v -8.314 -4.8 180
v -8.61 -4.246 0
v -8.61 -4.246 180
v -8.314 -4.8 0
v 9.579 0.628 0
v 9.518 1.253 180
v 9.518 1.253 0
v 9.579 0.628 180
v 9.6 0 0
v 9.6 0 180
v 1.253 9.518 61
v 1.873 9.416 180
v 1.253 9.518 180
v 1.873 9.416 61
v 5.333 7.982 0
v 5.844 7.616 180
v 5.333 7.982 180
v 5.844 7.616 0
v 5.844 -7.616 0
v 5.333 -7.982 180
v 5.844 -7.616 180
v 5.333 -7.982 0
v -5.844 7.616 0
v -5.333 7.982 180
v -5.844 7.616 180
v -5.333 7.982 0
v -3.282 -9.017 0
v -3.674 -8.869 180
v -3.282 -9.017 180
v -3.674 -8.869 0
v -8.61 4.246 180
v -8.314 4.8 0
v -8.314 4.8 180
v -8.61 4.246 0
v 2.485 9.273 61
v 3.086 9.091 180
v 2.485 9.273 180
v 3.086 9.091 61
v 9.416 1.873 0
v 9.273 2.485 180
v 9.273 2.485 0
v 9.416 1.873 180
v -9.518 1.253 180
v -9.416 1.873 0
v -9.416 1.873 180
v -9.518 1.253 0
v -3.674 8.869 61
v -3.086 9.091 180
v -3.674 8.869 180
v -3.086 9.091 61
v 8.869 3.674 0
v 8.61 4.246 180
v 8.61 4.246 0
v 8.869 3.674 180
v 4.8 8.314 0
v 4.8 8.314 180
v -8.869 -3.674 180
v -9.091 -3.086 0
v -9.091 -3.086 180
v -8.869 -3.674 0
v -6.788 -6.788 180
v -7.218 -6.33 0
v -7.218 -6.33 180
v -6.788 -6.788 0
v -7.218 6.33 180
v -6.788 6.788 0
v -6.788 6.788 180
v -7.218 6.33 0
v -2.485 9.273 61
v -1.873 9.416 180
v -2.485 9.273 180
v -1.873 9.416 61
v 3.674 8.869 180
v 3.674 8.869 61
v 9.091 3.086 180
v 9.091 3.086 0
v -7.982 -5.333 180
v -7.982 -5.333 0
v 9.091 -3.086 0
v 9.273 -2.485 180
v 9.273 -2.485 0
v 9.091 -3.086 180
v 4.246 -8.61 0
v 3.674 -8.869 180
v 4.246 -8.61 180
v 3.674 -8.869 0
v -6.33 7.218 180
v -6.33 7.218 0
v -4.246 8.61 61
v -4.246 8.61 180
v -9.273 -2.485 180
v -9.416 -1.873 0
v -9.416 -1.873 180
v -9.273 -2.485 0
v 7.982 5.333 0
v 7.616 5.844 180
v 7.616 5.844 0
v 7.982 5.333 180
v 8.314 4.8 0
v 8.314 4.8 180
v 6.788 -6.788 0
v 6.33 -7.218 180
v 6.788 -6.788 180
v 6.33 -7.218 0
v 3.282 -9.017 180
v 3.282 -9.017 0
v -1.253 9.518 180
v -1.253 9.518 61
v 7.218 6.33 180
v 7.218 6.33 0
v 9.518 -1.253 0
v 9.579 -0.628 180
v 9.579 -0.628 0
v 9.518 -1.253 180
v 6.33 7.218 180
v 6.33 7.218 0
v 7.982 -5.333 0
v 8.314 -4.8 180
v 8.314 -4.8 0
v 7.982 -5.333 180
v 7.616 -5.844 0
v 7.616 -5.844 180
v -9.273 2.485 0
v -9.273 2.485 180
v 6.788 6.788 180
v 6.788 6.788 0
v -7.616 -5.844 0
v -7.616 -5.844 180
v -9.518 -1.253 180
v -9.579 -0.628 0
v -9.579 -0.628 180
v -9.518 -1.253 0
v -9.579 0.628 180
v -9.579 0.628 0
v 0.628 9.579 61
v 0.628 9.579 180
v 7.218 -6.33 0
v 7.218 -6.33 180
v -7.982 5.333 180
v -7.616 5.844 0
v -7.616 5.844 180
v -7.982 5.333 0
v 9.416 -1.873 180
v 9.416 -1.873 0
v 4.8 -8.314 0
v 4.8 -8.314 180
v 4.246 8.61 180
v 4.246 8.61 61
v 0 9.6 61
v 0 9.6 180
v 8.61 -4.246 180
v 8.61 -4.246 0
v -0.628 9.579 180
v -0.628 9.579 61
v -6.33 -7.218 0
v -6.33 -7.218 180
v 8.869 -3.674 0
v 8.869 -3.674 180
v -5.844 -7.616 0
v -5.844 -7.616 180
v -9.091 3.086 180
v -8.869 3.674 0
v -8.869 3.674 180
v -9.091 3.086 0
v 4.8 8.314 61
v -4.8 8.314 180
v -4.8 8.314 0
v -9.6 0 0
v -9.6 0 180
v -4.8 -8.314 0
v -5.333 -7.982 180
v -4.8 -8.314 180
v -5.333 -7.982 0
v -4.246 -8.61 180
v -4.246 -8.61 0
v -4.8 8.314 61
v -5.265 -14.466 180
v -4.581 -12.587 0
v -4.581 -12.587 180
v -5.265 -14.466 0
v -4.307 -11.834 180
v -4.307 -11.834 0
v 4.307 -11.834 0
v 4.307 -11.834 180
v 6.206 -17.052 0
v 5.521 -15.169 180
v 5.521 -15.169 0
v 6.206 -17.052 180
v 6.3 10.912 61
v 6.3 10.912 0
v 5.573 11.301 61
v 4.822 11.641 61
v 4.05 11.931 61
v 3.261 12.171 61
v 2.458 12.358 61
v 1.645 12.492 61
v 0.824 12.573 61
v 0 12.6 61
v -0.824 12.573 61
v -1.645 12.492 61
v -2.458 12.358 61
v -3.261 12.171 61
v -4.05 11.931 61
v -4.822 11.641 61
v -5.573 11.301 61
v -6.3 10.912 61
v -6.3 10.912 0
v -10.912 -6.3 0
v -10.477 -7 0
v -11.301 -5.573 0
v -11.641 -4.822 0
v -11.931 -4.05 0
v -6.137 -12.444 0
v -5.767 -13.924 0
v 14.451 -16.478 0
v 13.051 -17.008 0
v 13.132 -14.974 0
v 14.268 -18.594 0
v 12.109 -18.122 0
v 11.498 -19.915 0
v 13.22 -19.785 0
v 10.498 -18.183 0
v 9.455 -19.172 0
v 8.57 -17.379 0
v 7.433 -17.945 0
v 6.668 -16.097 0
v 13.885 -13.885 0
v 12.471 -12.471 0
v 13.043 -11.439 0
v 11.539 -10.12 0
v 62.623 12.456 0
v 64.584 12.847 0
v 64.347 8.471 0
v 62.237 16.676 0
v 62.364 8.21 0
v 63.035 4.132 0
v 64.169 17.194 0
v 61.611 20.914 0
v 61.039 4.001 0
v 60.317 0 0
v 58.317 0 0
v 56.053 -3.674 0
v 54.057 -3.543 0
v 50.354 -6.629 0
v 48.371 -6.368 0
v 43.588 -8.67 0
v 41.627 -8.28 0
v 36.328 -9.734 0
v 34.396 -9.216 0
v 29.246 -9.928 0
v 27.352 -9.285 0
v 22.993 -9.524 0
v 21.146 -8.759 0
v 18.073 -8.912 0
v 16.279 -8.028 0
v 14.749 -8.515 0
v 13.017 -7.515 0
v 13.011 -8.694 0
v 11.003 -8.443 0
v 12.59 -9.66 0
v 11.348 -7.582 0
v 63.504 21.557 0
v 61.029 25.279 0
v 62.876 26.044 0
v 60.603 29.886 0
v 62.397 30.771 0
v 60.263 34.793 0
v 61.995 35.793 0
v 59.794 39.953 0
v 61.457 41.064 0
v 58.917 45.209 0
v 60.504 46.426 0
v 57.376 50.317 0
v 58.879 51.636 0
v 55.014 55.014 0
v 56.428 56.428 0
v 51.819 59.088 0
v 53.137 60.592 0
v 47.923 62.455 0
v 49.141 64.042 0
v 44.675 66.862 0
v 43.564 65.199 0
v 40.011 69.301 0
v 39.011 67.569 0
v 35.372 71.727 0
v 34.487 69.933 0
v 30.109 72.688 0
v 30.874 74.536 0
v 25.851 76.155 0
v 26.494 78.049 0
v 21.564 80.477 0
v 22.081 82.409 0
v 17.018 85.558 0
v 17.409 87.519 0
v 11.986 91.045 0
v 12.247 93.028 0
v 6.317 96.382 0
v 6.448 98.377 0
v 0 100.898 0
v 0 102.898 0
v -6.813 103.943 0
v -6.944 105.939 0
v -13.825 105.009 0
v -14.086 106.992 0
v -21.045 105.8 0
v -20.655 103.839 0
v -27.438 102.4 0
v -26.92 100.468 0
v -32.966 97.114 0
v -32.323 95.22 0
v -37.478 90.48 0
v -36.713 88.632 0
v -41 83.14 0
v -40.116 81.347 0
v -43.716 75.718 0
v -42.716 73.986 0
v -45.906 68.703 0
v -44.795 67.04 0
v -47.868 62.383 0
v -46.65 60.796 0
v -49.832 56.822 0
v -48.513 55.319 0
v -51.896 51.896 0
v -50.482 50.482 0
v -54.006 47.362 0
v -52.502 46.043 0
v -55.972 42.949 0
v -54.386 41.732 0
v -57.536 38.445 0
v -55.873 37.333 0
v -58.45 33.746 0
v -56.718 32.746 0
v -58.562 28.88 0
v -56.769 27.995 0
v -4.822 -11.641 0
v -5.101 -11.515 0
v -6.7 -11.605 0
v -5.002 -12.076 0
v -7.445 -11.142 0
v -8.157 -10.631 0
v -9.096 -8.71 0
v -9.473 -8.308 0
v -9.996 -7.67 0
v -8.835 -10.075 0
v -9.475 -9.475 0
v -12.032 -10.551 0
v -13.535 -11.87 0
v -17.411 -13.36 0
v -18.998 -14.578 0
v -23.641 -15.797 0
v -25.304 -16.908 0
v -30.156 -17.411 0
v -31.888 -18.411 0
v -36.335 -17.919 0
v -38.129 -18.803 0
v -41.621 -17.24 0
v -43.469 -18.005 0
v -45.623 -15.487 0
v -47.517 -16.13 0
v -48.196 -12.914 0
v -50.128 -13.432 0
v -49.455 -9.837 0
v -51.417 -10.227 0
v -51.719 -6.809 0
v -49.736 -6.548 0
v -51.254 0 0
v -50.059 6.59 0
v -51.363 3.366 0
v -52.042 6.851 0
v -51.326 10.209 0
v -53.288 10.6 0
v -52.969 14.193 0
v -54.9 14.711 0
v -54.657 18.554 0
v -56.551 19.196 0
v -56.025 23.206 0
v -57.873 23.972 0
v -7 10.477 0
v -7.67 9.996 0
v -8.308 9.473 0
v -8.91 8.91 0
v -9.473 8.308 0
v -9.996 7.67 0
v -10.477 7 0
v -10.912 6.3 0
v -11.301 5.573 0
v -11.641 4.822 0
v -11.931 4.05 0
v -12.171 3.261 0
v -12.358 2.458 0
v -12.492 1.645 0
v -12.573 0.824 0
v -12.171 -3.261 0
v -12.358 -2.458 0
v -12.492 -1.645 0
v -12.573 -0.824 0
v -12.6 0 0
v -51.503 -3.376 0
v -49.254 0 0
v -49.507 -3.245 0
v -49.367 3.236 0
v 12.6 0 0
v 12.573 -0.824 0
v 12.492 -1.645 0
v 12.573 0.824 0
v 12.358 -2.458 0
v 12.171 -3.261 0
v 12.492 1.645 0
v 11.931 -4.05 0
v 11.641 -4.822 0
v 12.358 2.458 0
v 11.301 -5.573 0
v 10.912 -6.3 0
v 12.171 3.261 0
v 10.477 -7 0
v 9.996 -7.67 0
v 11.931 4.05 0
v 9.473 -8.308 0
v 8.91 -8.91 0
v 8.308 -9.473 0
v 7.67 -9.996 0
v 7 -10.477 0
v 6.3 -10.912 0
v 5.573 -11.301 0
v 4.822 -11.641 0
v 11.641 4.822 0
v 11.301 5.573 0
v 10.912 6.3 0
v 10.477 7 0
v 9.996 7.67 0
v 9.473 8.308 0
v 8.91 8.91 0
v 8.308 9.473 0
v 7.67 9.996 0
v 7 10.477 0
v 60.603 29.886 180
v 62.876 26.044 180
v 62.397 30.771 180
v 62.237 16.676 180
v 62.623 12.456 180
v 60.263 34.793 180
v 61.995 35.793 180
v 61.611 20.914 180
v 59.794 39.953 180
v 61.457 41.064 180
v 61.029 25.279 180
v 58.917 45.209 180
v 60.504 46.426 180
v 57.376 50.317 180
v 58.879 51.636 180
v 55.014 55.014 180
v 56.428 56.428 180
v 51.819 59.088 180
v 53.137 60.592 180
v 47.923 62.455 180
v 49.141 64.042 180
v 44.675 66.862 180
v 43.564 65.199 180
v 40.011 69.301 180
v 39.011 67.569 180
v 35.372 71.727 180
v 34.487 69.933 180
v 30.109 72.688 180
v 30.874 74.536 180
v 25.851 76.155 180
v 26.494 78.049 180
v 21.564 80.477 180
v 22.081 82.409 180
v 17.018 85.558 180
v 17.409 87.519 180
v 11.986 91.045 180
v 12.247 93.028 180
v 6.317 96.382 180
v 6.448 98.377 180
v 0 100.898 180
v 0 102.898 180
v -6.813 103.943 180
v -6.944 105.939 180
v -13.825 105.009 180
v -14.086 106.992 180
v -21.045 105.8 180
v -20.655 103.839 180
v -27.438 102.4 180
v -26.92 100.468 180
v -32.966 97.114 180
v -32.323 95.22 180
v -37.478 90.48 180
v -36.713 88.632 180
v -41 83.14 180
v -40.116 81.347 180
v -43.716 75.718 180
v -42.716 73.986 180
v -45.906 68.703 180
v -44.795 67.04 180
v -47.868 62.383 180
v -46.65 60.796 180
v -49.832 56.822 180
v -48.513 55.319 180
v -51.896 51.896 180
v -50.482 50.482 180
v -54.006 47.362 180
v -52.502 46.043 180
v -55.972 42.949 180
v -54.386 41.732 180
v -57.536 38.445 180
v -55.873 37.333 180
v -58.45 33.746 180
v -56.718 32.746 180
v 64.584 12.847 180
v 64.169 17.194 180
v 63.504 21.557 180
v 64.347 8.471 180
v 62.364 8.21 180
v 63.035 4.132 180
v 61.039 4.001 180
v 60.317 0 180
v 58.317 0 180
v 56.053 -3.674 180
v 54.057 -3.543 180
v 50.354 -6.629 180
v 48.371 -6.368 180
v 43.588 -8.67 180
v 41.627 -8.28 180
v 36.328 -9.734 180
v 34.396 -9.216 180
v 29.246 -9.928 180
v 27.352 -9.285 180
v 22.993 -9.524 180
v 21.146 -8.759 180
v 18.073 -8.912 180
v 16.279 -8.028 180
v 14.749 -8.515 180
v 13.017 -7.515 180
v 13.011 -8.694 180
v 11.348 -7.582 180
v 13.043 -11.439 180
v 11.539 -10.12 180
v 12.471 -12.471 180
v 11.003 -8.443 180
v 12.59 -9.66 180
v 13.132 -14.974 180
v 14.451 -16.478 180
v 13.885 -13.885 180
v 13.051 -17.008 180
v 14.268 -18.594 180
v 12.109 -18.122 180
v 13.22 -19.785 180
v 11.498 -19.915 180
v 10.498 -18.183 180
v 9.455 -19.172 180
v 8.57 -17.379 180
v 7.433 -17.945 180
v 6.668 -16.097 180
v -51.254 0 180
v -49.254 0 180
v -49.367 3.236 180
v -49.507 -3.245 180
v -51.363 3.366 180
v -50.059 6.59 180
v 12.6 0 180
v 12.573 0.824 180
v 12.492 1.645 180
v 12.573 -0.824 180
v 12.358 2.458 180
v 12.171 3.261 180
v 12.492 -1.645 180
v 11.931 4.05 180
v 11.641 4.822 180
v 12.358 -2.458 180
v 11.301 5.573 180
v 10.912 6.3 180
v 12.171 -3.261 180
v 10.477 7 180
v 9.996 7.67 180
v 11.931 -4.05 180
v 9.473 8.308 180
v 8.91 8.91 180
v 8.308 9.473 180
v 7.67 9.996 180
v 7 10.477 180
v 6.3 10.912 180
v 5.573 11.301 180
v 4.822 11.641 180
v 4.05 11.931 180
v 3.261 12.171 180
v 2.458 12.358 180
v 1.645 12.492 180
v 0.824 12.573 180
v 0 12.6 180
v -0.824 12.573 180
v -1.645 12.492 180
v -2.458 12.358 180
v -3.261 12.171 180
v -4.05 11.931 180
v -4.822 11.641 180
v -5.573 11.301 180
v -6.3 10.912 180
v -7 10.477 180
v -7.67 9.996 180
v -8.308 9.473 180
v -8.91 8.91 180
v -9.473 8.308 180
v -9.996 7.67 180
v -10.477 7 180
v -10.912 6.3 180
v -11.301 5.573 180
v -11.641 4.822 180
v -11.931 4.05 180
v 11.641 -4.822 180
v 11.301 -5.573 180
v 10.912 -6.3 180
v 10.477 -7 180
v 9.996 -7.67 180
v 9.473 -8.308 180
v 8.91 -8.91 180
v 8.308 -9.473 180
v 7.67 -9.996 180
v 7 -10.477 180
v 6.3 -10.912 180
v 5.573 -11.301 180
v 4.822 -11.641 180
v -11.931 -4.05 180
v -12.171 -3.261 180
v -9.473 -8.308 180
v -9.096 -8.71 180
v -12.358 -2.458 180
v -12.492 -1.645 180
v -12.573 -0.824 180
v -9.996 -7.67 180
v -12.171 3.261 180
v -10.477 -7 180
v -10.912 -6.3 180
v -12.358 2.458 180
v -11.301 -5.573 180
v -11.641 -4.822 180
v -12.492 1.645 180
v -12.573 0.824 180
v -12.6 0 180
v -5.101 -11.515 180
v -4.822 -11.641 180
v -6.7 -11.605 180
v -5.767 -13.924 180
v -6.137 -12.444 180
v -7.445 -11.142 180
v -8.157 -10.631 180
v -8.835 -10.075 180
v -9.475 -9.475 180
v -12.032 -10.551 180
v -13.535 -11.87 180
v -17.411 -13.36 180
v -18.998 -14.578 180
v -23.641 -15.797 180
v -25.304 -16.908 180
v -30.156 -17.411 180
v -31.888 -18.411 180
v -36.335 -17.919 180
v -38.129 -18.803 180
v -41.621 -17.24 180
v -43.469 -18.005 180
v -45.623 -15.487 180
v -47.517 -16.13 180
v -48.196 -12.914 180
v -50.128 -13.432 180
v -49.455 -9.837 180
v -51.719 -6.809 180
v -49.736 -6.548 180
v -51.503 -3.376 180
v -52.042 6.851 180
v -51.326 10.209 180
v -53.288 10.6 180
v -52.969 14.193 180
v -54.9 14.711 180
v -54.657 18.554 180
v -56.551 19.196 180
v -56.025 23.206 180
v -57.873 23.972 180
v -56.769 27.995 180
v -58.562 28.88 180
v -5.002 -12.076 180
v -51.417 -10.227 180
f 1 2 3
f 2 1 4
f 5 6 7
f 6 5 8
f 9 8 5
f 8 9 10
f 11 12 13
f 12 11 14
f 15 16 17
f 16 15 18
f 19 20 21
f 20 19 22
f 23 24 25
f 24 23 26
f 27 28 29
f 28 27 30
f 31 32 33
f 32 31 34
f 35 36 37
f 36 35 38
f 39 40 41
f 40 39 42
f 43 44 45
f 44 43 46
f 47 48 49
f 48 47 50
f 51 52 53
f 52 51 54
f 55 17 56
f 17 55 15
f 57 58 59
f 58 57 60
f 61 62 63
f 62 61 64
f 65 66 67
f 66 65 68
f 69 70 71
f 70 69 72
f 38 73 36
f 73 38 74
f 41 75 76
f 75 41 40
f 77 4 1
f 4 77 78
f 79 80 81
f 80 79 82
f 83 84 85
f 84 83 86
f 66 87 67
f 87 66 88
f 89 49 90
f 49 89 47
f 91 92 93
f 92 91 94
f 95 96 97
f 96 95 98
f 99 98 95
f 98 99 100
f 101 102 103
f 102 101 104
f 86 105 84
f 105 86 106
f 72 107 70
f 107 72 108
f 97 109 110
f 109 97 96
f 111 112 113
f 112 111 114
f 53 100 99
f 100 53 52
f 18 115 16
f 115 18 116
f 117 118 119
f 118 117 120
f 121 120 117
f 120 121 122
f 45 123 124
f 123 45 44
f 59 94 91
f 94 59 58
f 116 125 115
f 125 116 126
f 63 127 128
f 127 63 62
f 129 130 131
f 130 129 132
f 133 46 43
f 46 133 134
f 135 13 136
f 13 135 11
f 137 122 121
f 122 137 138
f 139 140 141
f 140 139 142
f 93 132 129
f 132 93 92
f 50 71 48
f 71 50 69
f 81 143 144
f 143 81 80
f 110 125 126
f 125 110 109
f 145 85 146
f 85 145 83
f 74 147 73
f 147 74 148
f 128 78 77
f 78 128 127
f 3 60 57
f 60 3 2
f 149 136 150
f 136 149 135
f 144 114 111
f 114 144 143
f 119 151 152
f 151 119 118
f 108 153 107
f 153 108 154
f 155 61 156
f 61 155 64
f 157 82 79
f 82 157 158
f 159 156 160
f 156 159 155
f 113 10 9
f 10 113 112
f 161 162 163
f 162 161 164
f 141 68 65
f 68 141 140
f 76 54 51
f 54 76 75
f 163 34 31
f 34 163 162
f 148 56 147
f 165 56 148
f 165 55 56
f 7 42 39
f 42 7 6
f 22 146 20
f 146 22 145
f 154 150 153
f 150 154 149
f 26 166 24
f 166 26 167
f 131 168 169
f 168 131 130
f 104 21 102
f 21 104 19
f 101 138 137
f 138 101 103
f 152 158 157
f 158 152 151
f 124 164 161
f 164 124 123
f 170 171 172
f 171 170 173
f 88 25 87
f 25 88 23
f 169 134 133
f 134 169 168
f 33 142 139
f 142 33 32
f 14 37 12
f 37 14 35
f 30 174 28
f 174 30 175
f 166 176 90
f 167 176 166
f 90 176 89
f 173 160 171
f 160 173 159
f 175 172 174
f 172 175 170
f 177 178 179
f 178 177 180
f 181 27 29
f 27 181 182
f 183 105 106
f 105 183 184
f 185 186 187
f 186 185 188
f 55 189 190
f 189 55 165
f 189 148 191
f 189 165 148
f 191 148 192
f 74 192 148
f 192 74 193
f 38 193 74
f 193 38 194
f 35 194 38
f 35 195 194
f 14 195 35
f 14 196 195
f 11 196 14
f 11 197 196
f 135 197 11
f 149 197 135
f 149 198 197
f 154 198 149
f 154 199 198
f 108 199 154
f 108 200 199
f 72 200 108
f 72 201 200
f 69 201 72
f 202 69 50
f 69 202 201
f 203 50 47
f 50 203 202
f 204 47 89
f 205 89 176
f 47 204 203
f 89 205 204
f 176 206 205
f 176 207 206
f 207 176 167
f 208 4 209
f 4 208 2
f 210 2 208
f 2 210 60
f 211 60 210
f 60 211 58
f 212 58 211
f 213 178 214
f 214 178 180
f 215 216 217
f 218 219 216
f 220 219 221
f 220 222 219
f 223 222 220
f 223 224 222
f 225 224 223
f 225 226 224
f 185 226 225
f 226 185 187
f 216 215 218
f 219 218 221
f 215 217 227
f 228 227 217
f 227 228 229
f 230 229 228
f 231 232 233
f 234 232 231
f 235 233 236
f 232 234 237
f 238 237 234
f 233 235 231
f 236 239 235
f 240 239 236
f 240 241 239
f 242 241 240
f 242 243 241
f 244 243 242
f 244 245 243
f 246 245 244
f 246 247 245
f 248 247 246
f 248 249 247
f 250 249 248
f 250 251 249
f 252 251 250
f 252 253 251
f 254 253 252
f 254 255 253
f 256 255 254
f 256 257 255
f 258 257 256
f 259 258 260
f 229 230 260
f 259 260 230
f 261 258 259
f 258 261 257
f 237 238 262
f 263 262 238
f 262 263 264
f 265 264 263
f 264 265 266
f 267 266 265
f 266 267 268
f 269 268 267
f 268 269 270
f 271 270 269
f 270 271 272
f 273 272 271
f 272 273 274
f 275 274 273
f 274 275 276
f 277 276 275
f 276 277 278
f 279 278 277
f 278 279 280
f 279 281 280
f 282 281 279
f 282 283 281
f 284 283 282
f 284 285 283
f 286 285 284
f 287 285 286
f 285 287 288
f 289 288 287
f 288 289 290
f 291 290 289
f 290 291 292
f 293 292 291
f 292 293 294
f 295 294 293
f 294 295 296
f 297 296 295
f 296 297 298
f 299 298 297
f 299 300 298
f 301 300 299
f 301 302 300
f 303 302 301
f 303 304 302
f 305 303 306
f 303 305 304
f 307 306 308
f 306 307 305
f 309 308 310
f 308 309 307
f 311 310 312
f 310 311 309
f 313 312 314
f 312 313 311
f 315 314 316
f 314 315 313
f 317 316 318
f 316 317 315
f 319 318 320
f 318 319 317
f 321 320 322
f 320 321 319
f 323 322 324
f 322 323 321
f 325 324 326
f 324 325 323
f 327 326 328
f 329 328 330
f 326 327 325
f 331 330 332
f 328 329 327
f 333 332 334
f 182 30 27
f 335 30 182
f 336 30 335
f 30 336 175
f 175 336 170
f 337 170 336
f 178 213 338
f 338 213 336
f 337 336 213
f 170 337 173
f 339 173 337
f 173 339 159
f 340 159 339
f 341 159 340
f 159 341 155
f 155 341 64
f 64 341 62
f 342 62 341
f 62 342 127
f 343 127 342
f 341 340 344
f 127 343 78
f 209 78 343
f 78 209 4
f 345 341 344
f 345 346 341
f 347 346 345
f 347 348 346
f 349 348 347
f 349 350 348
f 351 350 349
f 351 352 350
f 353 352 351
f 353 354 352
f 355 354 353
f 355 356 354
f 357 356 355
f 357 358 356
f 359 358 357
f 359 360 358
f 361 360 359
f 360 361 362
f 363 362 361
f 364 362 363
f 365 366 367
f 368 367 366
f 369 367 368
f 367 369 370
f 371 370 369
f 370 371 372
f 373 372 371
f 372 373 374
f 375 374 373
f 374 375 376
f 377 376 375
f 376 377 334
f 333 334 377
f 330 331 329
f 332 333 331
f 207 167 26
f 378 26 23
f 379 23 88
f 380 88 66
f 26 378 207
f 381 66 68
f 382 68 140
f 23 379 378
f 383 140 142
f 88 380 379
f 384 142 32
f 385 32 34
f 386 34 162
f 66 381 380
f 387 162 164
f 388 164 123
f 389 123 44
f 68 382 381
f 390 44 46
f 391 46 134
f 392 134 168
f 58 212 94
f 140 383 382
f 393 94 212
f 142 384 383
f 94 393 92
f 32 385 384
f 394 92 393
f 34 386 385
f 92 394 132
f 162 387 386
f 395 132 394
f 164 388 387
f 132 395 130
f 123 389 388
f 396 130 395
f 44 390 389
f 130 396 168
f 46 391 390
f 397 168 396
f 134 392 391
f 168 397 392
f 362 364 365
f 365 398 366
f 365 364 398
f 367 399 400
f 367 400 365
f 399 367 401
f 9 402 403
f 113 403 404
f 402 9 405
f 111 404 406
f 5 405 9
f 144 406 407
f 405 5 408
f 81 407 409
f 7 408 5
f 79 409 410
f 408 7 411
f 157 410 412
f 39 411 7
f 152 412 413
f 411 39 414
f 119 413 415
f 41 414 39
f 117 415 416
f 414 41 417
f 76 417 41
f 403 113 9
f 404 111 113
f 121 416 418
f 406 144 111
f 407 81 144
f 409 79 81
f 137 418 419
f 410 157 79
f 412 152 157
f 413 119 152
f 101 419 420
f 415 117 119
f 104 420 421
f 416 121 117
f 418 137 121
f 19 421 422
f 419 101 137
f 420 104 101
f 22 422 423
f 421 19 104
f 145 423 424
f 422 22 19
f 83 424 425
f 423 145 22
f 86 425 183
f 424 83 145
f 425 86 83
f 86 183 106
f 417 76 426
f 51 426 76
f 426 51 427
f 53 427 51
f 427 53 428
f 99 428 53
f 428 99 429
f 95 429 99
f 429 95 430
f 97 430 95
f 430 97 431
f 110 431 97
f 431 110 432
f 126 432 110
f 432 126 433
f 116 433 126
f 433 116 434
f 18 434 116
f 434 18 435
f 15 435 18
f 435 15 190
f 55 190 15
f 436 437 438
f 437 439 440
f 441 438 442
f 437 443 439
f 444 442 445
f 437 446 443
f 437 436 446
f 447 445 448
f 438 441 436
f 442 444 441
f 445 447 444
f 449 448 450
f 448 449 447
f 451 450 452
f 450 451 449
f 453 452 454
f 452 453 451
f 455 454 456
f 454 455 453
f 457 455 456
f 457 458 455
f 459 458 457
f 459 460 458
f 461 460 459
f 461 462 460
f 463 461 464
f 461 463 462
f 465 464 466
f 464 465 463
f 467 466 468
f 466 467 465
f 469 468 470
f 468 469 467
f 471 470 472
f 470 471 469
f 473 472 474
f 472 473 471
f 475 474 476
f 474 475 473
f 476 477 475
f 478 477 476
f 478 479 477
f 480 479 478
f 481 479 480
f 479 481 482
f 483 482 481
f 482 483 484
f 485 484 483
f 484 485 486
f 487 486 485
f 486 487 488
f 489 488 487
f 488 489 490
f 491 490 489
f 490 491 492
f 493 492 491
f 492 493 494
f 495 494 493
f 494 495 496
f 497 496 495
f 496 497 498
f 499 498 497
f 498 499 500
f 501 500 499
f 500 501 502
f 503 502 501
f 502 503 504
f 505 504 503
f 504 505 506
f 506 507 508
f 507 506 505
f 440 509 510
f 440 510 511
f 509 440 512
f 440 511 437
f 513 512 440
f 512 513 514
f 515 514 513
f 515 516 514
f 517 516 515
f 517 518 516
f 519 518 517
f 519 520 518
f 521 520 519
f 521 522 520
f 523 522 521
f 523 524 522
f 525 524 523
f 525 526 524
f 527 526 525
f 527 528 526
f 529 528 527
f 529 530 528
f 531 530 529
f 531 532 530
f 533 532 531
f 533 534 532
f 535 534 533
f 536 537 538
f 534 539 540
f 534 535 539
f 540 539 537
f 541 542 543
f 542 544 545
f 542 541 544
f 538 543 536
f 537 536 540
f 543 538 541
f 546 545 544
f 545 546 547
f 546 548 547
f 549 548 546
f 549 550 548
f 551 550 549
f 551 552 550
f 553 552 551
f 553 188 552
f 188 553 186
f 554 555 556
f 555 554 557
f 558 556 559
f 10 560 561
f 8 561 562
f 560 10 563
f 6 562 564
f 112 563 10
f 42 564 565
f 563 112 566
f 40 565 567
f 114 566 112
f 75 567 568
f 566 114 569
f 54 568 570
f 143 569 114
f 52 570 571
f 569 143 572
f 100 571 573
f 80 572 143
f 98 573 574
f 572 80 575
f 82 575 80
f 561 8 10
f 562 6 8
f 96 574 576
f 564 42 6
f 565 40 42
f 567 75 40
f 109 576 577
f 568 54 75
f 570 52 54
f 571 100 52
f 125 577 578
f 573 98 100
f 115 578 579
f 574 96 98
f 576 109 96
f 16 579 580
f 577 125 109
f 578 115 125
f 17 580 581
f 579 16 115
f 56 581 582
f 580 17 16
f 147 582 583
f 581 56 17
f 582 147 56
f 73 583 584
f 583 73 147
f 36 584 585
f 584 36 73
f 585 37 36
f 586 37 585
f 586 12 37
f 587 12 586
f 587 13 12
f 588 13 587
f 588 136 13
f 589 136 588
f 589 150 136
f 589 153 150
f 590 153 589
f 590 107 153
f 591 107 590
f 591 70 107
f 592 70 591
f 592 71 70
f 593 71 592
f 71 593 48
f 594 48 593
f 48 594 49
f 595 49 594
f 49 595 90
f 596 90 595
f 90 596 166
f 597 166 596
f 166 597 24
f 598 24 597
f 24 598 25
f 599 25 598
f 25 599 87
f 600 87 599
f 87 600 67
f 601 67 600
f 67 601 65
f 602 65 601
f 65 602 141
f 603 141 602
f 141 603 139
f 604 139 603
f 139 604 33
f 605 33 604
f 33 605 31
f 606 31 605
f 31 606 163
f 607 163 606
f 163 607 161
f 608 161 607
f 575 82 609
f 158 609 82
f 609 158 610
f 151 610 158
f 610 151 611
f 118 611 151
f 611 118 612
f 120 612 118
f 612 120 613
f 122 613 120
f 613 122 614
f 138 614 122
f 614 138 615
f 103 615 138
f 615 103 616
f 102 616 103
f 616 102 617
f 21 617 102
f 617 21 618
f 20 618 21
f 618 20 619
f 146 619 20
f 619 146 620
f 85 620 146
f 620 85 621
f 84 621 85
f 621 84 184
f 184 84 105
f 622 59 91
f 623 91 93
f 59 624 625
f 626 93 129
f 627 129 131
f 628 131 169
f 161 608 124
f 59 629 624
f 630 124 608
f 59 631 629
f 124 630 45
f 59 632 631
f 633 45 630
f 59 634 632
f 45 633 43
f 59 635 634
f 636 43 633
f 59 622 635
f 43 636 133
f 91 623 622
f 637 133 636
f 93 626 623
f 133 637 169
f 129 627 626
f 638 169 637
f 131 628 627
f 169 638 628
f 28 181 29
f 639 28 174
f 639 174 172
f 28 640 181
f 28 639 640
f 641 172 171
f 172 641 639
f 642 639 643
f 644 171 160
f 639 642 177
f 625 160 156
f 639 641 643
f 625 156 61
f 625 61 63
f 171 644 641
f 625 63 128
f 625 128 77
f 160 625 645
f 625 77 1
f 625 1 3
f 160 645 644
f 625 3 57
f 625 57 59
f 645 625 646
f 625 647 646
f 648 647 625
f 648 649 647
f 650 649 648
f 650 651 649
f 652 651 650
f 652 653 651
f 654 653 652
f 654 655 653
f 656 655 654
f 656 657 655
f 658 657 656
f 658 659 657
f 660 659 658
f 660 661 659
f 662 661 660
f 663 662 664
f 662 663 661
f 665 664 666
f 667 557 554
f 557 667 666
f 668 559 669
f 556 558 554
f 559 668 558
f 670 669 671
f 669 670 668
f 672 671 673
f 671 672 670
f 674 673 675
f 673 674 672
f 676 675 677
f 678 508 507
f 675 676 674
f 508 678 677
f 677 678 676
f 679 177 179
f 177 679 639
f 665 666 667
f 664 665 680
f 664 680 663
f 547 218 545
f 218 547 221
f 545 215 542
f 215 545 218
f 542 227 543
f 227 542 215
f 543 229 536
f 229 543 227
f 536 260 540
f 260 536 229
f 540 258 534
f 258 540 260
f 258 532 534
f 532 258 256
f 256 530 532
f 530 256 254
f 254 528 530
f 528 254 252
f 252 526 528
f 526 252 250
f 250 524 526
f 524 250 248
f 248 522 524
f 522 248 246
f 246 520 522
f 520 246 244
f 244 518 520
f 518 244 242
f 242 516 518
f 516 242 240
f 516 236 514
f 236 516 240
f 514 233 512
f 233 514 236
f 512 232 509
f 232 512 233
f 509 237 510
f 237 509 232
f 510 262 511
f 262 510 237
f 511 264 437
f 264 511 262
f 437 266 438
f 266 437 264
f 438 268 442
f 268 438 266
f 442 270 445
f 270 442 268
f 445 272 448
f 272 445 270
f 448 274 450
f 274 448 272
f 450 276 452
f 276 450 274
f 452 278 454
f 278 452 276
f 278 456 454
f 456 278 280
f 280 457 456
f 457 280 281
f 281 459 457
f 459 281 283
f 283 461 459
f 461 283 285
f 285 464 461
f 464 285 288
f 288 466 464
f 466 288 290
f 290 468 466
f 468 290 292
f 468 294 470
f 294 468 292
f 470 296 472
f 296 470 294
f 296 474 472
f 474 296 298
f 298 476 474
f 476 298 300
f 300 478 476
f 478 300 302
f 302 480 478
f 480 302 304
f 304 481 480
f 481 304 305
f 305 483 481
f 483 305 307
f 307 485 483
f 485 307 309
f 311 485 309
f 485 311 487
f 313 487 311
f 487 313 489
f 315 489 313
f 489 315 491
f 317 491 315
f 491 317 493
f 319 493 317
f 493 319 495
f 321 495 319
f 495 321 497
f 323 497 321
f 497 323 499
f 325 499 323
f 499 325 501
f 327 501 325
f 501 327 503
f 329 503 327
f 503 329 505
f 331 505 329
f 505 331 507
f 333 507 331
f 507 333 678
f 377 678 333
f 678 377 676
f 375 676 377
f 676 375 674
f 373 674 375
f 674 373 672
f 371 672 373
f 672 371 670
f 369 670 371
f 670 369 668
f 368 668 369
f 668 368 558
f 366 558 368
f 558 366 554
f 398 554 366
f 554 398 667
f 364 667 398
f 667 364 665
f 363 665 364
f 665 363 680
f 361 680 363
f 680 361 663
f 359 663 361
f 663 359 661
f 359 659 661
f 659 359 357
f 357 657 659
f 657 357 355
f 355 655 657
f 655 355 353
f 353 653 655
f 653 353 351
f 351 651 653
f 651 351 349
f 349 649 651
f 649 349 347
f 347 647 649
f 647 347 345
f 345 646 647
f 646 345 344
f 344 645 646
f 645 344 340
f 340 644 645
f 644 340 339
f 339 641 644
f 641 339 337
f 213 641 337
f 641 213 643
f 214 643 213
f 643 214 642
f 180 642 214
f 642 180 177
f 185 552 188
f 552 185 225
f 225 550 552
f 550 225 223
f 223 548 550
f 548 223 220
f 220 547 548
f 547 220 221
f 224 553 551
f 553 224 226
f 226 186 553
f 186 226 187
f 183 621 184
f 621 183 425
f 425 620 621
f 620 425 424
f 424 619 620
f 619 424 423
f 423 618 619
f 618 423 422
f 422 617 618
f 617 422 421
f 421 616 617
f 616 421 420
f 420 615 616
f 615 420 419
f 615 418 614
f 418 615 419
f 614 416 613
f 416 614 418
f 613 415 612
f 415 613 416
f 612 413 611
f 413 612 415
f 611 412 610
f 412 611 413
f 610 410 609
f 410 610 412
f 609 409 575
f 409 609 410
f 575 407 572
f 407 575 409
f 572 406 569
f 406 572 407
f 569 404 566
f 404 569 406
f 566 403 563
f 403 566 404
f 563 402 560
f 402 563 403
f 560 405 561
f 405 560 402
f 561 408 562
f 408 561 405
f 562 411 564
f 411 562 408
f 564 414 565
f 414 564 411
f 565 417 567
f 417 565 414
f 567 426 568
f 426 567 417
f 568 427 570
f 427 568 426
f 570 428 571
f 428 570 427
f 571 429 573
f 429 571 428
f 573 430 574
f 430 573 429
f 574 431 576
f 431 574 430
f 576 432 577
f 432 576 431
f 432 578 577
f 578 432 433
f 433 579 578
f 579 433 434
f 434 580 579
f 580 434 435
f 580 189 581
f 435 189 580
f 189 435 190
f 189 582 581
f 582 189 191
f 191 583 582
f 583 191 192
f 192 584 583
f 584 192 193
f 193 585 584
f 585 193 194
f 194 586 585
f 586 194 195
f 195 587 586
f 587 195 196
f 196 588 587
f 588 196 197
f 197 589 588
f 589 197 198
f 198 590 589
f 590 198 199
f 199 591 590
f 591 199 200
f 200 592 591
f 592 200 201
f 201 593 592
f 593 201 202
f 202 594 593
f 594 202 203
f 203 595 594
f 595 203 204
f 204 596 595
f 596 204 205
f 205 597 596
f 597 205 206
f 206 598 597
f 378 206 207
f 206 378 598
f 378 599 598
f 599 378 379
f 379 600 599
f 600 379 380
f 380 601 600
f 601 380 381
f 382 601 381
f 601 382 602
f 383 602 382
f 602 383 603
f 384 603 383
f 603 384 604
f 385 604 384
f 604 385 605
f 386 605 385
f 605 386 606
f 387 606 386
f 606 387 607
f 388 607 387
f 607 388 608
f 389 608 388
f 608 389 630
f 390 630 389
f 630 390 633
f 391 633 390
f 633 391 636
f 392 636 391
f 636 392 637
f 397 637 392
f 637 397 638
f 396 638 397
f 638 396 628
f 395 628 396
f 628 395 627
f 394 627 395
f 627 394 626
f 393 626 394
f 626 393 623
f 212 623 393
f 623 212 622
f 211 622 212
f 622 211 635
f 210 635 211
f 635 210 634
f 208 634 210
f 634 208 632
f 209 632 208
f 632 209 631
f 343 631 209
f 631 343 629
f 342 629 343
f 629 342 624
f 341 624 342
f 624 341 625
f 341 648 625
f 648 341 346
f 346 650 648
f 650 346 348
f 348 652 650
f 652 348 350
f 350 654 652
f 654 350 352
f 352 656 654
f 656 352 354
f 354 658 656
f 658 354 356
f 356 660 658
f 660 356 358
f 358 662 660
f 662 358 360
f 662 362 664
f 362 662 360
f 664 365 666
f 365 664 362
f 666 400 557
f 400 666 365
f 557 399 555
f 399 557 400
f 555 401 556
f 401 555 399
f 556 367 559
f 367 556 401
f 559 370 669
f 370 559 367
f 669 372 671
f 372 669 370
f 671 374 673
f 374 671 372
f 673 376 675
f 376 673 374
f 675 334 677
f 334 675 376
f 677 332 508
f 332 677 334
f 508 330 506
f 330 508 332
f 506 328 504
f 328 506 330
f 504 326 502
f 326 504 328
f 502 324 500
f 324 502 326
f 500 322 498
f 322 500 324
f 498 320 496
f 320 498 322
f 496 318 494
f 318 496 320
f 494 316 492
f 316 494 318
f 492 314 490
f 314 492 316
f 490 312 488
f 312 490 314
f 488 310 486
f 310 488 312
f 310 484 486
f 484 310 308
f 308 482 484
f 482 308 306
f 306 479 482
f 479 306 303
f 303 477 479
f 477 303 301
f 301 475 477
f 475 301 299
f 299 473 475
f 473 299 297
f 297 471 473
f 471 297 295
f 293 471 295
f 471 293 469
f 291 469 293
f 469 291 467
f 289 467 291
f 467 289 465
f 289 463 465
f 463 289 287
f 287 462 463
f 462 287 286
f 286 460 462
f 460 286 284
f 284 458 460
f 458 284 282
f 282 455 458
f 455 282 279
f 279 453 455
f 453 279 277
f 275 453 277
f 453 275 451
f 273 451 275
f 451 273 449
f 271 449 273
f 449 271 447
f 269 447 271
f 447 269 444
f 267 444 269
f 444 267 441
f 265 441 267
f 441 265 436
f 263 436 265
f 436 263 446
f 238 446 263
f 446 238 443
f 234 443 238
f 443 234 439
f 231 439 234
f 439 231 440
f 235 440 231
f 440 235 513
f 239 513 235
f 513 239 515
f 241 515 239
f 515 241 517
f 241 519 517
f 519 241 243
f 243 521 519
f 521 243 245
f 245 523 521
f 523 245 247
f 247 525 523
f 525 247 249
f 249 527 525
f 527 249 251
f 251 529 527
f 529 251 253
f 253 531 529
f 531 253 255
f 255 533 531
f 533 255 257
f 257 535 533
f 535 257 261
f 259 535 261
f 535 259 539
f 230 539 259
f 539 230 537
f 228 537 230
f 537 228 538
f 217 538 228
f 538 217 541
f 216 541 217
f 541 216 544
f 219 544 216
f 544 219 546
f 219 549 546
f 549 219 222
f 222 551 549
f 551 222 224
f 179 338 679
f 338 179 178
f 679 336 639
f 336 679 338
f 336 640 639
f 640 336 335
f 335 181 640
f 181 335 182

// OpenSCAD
// Lampenschirm für Stehlampe – organischer, wellenförmiger Querschnitt
// mit Klemmkragen, der in die Form integriert ist (keine D-Form mehr)
// Alle Maße in Millimetern (Regel: units-mm)
//
// Kontext: context/printer.md, context/tolerances.md und context/materials.md
// waren zum Zeitpunkt der Modellierung leer (siehe Regel: context-first).
// Annahmen aus dem Design-Dialog (siehe auch 001/002):
//   - Baubett >= 200mm Z-Höhe vorhanden -> Schirm wird als ein Teil,
//     stehend, in voller Höhe gedruckt.
//   - Klemmkragen als offener Federclip (C-Ring): Innendurchmesser 0.8mm
//     unter Stangendurchmesser (19.2mm ID auf 20mm Stange) für Vorspannung.
//   - E14-Fassung wird separat an der Stange montiert.
//
// Änderungen gegenüber 006 (Nutzer-Feedback: "die markierten Auswüchse
// [Verbindungsstege] sollen ganz weg"):
//   - Keine separaten Verbindungsstege/Rippen mehr. Stattdessen zieht sich
//     die Außenkontur an der Rückseite (θ=270°) selbst eng um den
//     Klemmkragen zusammen (Fourier-Basis neu gefittet: Rückseite jetzt
//     ~14mm statt ~25mm), sodass Kragen und Wand dort direkt ineinander
//     übergehen - keine separate Geometrie, kein sichtbarer "Auswuchs".
//   - Die Wellen-Überlagerung wird über eine weiche Hüllkurve (wave_envelope)
//     in der Nähe der Rückseite ausgeblendet, damit die enge Passage dort
//     nicht durch die Wellen unvorhersehbar eingeschnürt oder aufgerissen
//     wird. Abseits der Rückseite (Seiten/Front) bleibt die volle Wellenform
//     erhalten.
//   - Die Wandberechnung nutzt jetzt keine offset()-Funktion mehr, sondern
//     berechnet die Innenkontur direkt über denselben Radius abzüglich
//     wall_t (organic_outline(shrink=wall_t)). Das ist robuster als
//     offset() bei welligen/konkaven Konturen (siehe Bugs in 003/004) und
//     garantiert gleichzeitig, dass die Innenkontur an der Rückseite den
//     Klemmkragen direkt überlappt (keine Lücke, keine Rippe nötig).

// ---- Parameter ----
shade_height = 180;   // Gesamthöhe des Schirms
wall_t       = 2;     // Wandstärke Schirm (durchgehend, auch am Klemmkragen-Übergang)

rod_d      = 20;                 // Durchmesser der Metallstange
rod_r      = rod_d / 2;
clip_id    = 19.2;               // Innendurchmesser Klemmkragen (Vorspannung, ~0.8mm Untermaß)
clip_r_in  = clip_id / 2;
clip_wall  = 3;                  // Wandstärke Klemmkragen (dicker als Schirmwand, für Klemmkraft)
clip_r_out = clip_r_in + clip_wall;
clip_gap_deg = 40;               // Öffnungswinkel des C-Rings (Montagespalt, zeigt nach -Y)

socket_slot_deg    = 60;              // Öffnungswinkel des Fassungs-Schlitzes (Innenseite, +Y) - Annahme
socket_slot_height = shade_height / 3; // unteres Drittel der Klemme ist auf der Innenseite offen

// Organische Grundform (Fourier-Basis, Radius in mm ab Stangenmitte):
// front (θ=90°, +Y) ≈ 95mm, Seiten (θ=0°/180°) ≈ 50mm, Rückseite (θ=270°,
// -Y) ≈ 14mm - eng genug, dass die Wand dort direkt in den Klemmkragen
// (clip_r_out = 12.6mm) übergeht.
base_a0 = 52.25;
base_a1 = 40.5;
base_a2 = 2.25;

// Wellen-Überlagerung für den organischen/wellenförmigen Look
wave_amp1 = 9;   wave_freq1 = 4;  wave_phase1 = 40;
wave_amp2 = 5;   wave_freq2 = 7;  wave_phase2 = 115;

// Hüllkurve, die die Welle in der Nähe der Rückseite (θ=270°) ausblendet,
// damit die enge Passage um den Klemmkragen nicht durch die Welle gestört
// wird. Volle Wellenstärke ab wave_fade_width Grad Abstand von der Rückseite.
wave_fade_width = 50;

min_r = clip_r_out + wall_t - 1.2;   // Sicherheitsuntergrenze (Reserve, greift im Normalfall nicht ein)

cut_far = 300;   // "unendlich" großer Radius für Schnitte, die garantiert bis nach außen durchbrechen sollen

$fn = 96;

// Winkelabstand zwischen theta und center (0-180°, robust über den 0°/360°-Übergang)
function angle_diff(theta, center) =
    let(d = abs(theta - center))
    (d > 180) ? 360 - d : d;

// Hüllkurve 0 (direkt an der Rückseite) bis 1 (ab wave_fade_width Grad Abstand)
function wave_envelope(theta) =
    let(d = angle_diff(theta, 270))
    (d >= wave_fade_width) ? 1 : (1 - cos(180 * d / wave_fade_width)) / 2;

// Radius der organischen Kontur in Abhängigkeit vom Winkel θ (Grad)
function organic_r(theta) =
    let(phi = theta - 90)
    let(base = base_a0 + base_a1 * cos(phi) + base_a2 * cos(2 * phi))
    let(raw_wave = wave_amp1 * sin(wave_freq1 * theta + wave_phase1)
                 + wave_amp2 * sin(wave_freq2 * theta + wave_phase2))
    let(wave = raw_wave * wave_envelope(theta))
    max(base + wave, min_r);

// Geschlossenes 2D-Profil der organischen Kontur, um shrink (mm) nach innen
// verkleinert (shrink=0 -> Außenkontur, shrink=wall_t -> Innenkontur).
// Direkte Radius-Berechnung statt offset() - robust bei welliger Kontur.
module organic_outline(shrink = 0) {
    step = 360 / $fn;
    polygon(points = [
        for (t = [0 : step : 360 - step])
            [(organic_r(t) - shrink) * cos(t), (organic_r(t) - shrink) * sin(t)]
    ]);
}

// Keilförmiger 2D-Ausschnitt, zentriert auf Winkel 0
module pie_wedge_2d(radius, angle_deg) {
    a = angle_deg / 2;
    polygon(points = [
        [0, 0],
        [radius * cos(a), radius * sin(a)],
        [radius * cos(-a), radius * sin(-a)]
    ]);
}

// Voller Klemmkragen-Rohling (Bohrung/Spalt werden erst in 3D herausgeschnitten).
// Überlappt an der Rückseite direkt mit der Innenkontur der Schirmwand
// (organic_outline(wall_t) hat dort Radius < clip_r_out) - keine zusätzliche
// Verbindungsgeometrie nötig.
module collar_disk_2d() {
    circle(r = clip_r_out);
}

// 2D-Profil der Wand: durchgehend wall_t dick, plus Klemmkragen-Rohling
module shell_with_boss_2d() {
    union() {
        difference() {
            organic_outline(0);
            organic_outline(wall_t);
        }
        collar_disk_2d();
    }
}

module organic_shell() {
    linear_extrude(height = shade_height)
        shell_with_boss_2d();
}

// Radialer Schlitz von z0 bis z1, in Richtung facing_deg ausgerichtet
module radial_slot(radius, angle_deg, facing_deg, z0, z1) {
    translate([0, 0, z0])
        rotate([0, 0, facing_deg])
            linear_extrude(z1 - z0)
                pie_wedge_2d(radius, angle_deg);
}

// Alle Ausschnitte für die Klemme: durchgehende Stangenbohrung + Montagespalt
// (volle Höhe, -Y, bricht bis zur echten Außenwand durch, damit seitlich
// eingeclipst werden kann) + Fassungs-Schlitz (unteres Drittel, +Y, öffnet
// nur bis in den ohnehin dort schon hohlen Innenraum)
module clamp_cutouts() {
    union() {
        translate([0, 0, -1])
            cylinder(r = clip_r_in, h = shade_height + 2);

        radial_slot(cut_far, clip_gap_deg, 270, -1, shade_height + 1);

        radial_slot(clip_r_out + 5, socket_slot_deg, 90, -1, socket_slot_height + 1);
    }
}

// render() erzwingt die vollständige (exakte) Boolesche Berechnung statt der
// schnellen OpenCSG-Live-Vorschau, damit die Klemme auch in der OpenSCAD-
// Vorschau (F5) korrekt dargestellt wird.
render(convexity = 10)
    difference() {
        organic_shell();
        clamp_cutouts();
    }
